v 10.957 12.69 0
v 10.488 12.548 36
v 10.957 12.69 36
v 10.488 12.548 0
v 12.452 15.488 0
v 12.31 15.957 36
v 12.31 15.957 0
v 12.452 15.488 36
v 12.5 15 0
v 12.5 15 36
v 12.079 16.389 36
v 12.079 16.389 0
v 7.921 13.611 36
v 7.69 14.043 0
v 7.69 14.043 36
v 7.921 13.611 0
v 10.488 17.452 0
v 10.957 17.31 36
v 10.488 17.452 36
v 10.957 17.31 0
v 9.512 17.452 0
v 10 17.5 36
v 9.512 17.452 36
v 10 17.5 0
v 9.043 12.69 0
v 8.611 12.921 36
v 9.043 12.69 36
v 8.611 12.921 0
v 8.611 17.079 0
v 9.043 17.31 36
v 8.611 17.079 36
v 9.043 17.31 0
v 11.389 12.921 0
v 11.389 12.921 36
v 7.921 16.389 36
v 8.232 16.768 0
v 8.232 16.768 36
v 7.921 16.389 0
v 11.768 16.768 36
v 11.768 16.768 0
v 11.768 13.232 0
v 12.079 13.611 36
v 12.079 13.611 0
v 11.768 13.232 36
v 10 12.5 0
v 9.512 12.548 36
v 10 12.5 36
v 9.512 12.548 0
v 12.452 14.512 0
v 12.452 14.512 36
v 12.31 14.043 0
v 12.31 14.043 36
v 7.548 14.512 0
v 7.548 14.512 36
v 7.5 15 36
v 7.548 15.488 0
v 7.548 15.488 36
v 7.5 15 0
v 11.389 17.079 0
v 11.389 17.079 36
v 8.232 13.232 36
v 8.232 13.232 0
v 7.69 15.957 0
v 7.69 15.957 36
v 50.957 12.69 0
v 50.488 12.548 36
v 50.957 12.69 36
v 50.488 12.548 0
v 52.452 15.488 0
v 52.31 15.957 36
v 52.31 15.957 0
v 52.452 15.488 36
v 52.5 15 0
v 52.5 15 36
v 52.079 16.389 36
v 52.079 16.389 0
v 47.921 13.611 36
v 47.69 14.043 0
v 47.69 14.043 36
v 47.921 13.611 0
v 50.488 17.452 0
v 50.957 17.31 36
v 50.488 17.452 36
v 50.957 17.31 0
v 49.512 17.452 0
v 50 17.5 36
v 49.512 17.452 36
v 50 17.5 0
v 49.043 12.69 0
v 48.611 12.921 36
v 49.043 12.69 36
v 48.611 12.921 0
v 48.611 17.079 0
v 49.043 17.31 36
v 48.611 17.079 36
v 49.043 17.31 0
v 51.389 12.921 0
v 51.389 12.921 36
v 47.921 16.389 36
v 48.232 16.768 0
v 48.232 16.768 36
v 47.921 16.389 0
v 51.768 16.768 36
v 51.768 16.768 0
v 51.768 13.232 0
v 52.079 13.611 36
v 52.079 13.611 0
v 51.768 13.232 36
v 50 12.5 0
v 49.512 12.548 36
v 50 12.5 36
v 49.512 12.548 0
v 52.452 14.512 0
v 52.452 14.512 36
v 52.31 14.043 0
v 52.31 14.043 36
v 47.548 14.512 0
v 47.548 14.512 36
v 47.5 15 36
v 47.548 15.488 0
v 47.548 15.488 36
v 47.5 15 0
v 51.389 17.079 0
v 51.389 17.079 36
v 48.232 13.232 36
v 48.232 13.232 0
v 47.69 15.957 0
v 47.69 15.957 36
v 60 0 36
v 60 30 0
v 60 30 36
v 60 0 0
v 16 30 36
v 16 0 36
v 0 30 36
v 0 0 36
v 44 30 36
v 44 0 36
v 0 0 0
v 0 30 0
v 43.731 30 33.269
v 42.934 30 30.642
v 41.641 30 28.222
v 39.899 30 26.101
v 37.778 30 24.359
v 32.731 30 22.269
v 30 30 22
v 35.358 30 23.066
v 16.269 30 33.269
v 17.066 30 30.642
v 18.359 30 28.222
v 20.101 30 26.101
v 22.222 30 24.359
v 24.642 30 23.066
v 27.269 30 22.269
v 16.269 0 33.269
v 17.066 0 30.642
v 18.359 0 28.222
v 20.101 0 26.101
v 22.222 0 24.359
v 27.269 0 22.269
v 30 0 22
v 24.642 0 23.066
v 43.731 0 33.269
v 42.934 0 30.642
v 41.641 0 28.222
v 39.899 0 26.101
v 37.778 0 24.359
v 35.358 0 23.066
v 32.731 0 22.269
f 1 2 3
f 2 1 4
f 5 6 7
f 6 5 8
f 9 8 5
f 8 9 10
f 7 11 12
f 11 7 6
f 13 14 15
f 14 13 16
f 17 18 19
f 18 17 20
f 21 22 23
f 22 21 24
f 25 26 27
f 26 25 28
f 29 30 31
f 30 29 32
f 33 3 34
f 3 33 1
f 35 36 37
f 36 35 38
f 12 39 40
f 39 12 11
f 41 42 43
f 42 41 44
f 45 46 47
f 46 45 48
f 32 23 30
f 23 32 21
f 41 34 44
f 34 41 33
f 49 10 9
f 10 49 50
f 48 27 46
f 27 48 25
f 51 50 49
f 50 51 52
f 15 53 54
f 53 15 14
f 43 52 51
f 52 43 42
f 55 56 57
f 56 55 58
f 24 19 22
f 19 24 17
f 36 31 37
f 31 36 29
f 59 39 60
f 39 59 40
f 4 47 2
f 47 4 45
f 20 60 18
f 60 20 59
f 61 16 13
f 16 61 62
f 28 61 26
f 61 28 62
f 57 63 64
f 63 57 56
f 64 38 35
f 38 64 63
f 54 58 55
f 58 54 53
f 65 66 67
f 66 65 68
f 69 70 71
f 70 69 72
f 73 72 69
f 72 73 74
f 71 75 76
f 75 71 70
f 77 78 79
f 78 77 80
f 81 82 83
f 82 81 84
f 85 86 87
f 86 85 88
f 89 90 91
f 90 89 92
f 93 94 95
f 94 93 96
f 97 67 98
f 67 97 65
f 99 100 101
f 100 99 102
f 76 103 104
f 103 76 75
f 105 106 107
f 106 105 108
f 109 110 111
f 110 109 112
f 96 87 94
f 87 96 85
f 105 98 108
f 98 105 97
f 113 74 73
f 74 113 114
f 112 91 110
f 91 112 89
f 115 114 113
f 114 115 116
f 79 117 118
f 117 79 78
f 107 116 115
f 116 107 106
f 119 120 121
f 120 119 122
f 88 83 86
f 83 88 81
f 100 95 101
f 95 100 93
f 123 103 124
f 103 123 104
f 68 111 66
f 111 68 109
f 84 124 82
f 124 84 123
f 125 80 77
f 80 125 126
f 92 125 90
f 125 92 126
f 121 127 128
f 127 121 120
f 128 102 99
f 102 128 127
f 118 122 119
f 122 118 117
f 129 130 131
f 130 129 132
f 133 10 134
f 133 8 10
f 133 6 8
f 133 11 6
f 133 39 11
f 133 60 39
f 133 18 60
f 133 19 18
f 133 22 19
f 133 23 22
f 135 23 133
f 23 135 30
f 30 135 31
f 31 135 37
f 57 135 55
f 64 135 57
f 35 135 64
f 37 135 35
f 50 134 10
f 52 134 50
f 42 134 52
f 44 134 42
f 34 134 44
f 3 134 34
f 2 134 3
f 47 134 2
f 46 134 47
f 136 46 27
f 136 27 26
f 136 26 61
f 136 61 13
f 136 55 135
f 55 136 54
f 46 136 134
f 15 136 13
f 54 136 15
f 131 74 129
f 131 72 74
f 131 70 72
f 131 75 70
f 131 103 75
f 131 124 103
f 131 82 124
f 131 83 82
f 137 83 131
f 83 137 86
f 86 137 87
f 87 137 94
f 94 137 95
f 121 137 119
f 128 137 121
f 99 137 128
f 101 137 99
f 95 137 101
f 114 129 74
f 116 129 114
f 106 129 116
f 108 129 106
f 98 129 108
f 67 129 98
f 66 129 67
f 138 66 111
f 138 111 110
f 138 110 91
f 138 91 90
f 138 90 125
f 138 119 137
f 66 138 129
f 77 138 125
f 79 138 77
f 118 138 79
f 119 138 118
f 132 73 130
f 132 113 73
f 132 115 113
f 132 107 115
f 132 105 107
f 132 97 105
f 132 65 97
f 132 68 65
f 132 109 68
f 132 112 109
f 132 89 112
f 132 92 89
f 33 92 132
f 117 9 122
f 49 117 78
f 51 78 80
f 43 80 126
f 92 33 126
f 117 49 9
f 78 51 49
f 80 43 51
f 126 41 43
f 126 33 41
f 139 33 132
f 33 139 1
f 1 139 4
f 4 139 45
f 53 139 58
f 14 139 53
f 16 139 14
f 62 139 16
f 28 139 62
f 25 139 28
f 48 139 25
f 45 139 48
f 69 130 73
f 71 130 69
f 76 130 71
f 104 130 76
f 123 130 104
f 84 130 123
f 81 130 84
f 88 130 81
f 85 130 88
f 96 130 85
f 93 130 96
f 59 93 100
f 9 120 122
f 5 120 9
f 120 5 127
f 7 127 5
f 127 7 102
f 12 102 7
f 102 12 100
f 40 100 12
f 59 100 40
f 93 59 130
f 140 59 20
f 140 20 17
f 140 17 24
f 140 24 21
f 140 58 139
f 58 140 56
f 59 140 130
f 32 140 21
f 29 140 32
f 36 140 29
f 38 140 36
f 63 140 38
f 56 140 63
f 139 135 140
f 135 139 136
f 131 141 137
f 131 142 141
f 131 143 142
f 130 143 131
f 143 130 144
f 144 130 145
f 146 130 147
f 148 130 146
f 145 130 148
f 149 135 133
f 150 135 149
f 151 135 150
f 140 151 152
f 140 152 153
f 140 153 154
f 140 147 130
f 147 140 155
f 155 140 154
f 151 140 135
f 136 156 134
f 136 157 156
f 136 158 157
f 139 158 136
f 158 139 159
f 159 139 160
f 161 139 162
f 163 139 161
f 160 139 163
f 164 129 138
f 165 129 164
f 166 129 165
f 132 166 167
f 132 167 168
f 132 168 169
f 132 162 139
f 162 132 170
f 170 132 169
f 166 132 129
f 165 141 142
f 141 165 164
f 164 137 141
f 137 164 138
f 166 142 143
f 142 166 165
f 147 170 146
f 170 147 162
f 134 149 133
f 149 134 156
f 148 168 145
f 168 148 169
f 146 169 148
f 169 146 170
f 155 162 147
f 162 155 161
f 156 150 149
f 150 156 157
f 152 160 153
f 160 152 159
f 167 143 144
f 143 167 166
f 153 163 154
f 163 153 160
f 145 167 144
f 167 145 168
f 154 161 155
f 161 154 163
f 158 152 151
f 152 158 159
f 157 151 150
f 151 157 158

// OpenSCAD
$fn = 32;

// ----------------------------------------------------------------------
// Saddle clamp: plain shaft clamp
// ----------------------------------------------------------------------

// --- parameters (mm) ---
blk_l = 60;               // block length, X
blk_w = 30;               // block width, Y
blk_h = 36;               // block height
clamp_r = 14;             // shaft groove radius
hole_r = 2.5;             // bolt hole radius
hole_m = 10;              // bolt hole margin from the ends

saw_depth = clamp_r + 3;  // saw kerf depth

difference() {
  cube([blk_l, blk_w, blk_h]);
  translate([blk_l / 2, -1, blk_h])
    rotate([-90, 0, 0])
      cylinder(h = blk_w + 2, r = clamp_r);
  for (sx = [0, 1])
    translate([sx ? blk_l - hole_m : hole_m, blk_w / 2, -1])
      cylinder(r = hole_r, h = blk_h + 2);
}
